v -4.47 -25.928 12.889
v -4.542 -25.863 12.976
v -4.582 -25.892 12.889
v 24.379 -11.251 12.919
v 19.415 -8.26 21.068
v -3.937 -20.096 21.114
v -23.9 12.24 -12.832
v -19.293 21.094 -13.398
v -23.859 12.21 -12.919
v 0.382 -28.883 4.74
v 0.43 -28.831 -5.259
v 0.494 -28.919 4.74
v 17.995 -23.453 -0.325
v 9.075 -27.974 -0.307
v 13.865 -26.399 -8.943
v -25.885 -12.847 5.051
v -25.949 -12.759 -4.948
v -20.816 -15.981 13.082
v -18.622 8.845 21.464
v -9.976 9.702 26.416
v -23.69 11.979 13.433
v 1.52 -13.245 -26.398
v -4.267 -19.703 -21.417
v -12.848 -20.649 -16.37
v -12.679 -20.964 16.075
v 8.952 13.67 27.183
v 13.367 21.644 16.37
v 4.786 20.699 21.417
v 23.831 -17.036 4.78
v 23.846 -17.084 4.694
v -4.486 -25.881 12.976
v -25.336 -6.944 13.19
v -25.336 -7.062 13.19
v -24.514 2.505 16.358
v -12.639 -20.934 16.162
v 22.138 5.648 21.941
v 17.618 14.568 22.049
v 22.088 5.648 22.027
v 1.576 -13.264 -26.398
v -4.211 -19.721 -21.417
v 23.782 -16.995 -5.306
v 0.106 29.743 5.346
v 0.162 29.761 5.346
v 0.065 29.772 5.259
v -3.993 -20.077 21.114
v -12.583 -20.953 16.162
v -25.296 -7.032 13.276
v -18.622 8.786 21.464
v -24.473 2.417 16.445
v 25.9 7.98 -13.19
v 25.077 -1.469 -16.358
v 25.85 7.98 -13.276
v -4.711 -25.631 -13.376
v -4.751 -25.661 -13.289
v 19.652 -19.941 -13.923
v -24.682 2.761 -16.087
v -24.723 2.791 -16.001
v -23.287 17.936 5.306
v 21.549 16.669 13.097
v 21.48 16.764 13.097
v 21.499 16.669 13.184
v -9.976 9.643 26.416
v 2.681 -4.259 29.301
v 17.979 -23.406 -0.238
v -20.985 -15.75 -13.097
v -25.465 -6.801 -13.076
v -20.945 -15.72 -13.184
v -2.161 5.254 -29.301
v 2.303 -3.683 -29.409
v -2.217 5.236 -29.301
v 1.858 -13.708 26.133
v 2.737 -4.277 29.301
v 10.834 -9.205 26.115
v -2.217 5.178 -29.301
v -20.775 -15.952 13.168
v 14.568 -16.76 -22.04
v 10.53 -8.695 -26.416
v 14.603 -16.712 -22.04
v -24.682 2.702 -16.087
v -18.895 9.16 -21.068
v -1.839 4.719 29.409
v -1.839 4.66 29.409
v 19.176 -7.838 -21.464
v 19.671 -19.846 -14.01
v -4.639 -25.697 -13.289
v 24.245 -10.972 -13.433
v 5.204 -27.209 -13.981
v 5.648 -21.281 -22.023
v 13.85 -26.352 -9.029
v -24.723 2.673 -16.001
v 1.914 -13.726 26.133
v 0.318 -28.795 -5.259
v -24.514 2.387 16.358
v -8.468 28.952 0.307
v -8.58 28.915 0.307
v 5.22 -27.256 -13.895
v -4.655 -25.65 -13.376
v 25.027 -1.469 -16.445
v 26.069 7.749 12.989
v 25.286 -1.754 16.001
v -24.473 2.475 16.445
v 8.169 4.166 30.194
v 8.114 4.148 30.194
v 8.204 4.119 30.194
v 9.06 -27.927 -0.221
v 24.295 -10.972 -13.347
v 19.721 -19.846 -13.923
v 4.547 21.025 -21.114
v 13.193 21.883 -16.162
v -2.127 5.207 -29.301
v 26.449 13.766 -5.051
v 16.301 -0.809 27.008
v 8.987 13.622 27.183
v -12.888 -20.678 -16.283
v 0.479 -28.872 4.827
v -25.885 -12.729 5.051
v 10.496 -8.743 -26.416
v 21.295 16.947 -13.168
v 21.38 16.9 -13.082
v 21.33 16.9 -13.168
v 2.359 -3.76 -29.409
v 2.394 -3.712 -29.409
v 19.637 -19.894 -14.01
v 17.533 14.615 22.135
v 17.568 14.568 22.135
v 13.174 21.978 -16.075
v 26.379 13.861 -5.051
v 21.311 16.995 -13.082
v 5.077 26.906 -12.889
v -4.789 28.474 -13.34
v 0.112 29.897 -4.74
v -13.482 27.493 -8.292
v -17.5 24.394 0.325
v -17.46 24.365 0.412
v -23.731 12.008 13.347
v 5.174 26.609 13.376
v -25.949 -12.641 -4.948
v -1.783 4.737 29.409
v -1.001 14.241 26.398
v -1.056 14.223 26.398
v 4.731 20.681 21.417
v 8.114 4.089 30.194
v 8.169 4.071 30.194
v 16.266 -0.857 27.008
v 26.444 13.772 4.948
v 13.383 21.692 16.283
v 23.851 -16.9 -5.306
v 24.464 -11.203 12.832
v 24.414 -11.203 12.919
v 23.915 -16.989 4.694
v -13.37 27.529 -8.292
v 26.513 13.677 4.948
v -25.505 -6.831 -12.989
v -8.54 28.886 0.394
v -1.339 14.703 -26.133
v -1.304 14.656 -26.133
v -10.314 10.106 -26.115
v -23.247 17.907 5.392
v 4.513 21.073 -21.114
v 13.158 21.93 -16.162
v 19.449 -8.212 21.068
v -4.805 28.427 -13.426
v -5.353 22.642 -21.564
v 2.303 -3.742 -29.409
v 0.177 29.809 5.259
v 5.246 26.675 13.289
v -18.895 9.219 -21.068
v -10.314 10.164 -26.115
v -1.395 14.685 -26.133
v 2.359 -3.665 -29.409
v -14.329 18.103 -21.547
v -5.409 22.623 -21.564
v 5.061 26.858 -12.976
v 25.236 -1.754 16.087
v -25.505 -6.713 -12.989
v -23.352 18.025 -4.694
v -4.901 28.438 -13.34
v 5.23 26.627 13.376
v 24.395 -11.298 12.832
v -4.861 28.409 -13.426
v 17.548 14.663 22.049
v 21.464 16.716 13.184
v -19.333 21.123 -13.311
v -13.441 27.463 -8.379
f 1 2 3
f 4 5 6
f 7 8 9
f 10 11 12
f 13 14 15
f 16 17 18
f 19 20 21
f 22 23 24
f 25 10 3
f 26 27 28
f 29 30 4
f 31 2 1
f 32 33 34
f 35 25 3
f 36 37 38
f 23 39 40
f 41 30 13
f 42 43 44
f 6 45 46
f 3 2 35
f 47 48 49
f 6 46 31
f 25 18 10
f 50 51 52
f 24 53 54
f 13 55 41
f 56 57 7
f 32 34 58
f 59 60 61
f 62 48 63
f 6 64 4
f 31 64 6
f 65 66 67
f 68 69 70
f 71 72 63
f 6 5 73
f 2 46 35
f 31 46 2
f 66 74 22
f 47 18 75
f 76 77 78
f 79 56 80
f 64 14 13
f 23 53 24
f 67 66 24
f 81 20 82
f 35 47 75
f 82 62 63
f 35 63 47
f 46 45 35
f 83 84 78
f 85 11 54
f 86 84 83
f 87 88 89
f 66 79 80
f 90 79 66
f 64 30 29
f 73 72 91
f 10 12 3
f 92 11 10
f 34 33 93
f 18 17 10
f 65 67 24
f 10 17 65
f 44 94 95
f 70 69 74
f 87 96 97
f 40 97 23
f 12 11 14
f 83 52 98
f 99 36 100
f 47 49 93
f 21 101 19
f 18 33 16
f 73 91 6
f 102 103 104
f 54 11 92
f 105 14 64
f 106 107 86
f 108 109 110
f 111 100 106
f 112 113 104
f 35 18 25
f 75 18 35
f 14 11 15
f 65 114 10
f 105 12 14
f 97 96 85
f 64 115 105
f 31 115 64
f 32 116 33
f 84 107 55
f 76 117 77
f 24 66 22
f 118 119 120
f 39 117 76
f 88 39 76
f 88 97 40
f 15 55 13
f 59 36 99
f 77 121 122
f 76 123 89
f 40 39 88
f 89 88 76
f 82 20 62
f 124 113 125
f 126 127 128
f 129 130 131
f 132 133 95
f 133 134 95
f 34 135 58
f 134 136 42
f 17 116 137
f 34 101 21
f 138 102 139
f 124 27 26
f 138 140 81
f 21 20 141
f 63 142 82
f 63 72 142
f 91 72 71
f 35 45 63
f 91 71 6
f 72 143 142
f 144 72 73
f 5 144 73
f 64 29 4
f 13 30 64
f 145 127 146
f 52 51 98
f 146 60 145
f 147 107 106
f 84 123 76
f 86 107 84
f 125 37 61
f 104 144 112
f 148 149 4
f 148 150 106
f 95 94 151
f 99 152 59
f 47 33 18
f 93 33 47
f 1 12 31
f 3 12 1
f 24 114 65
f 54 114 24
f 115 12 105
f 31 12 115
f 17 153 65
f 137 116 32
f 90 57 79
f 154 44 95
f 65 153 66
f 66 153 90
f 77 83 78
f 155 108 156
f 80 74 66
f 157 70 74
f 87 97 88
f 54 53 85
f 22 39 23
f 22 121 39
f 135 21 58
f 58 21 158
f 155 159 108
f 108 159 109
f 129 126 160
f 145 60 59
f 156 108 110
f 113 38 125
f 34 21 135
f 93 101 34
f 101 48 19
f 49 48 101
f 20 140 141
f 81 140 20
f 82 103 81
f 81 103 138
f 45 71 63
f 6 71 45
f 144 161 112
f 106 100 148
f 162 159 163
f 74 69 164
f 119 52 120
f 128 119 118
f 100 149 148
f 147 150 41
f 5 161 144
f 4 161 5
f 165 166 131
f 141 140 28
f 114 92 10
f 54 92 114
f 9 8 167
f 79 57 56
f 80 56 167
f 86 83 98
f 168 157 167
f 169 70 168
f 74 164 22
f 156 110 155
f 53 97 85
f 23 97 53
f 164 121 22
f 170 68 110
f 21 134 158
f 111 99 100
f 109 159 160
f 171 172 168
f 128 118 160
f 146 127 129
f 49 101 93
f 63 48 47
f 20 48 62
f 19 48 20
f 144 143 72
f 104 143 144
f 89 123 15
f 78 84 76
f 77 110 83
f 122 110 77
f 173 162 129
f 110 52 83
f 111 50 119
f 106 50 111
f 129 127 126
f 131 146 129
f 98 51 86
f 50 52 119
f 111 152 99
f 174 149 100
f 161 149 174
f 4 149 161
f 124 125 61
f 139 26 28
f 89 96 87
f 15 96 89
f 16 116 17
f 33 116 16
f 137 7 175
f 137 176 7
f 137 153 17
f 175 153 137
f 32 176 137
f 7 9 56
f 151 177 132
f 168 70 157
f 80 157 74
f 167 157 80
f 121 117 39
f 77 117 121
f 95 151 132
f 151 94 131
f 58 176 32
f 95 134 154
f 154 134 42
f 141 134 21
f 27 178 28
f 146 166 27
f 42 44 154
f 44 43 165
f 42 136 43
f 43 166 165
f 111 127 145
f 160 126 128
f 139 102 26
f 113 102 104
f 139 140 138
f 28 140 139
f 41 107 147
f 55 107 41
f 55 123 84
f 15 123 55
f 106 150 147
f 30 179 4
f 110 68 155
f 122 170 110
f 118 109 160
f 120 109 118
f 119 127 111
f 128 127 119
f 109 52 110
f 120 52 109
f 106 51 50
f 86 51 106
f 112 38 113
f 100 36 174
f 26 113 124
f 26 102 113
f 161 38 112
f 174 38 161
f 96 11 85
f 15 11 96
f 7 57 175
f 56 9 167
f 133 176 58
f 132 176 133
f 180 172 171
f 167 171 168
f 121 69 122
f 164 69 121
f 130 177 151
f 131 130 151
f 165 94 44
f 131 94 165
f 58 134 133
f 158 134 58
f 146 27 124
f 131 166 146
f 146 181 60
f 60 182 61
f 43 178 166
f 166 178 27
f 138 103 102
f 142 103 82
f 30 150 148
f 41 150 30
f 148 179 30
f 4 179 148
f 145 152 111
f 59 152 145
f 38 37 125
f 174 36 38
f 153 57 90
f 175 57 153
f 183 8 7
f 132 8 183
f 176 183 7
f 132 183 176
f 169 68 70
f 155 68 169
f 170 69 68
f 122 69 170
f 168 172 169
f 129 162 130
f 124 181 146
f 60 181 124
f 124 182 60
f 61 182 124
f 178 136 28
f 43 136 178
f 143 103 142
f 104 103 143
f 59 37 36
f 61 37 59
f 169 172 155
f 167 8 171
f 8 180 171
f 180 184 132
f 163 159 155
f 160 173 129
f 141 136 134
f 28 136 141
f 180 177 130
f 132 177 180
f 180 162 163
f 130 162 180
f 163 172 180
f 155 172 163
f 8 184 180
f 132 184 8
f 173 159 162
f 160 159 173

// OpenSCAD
// Auto-generated OpenSCAD file

    inner_points = 10*[[2.5800168516054605, 0.7980470298110209, -1.3189669327443228], [-2.4432744118438516, 0.24459871431141972, 1.6358172684915129], [2.4977459589942073, -0.14685368717772146, -1.6358172684915129], [-2.525545304455105, -0.7003020026773228, 1.3189669327443228], [-1.0273929293488884, 1.013504771559999, -2.6028581143850014], [-1.8854735183802727, 0.9189645126628418, -2.098120715161195], [1.9399450655306283, -0.8212194855291437, 2.098120715161195], [1.081864476499244, -0.9157597444263008, 2.6028581143850014], [0.014605949080104583, 2.9713492457347006, 0.5259255605908952], [-0.4670162451205472, -2.5601958994998366, -1.3289486129136048], [0.521487792270903, 2.657940926633535, 1.3289486129136048], [0.03986559807025124, -2.873604218601002, -0.5259255605908952], [2.1279729957209983, 1.6899773807507408, -1.3081687185560238], [-2.3649952986203884, 1.194958158554797, 1.3346706145662746], [1.9125850025799456, -0.7838048123199333, -2.137693666888984], [-2.5803832917614407, -1.2788240345158768, 0.5051456662333142], [2.6348548389117963, 1.376569061649575, -0.5051456662333142], [-1.85811345542959, 0.8815498394536314, 2.137693666888984], [2.419466845770744, -1.0972131314210989, -1.3346706145662746], [-2.0735014485706427, -1.5922323536170426, 1.3081687185560238], [-0.13542060028755343, 1.465591309374031, -2.6046263101375176], [-2.3819047474582464, 1.218081698276059, -1.2832066435763685], [-0.21769149289880618, 0.5206905923852883, -2.921476645884708], [-2.464175640069499, 0.27318098128731644, -1.600056979323559], [2.518647187219855, -0.17543595415361818, 1.600056979323559], [0.27216304004916203, -0.42294556525159, 2.921476645884708], [2.436376294608602, -1.1203366711423608, 1.2832066435763685], [0.18989214743790928, -1.3678462822403328, 2.6046263101375176], [0.008147114355070081, 2.980181651968014, -0.47401457364421196], [-0.8499334746763137, 2.8856413930708573, 0.03072282557959416], [-0.4226288719270348, -1.967382734173334, -2.1330644703101322], [-1.2807094609584186, -2.0619229930704908, -1.6283270710863262], [1.3351810081087743, 2.1596680202041894, 1.6283270710863262], [0.47710041907739065, 2.0651277613070325, 2.1330644703101322], [0.9044050218266696, -2.7878963659371587, -0.03072282557959416], [0.04632443279528574, -2.8824366248343156, 0.47401457364421196], [1.3142797798831267, 2.1882502871800864, -1.6075471767287453], [-2.320607925426876, 1.7877713238812996, 0.5305547571697469], [1.0480455788235277, -0.8695126649837768, -2.632896401900285], [-2.5868421264864754, -1.2699916282825632, -0.49479446800179294], [2.641313673636831, 1.3677366554162613, 0.49479446800179294], [-0.9935740316731719, 0.9672576921174749, 2.632896401900285], [2.3750794725772315, -1.6900262967476014, -0.5305547571697469], [-1.259808232732771, -2.090505260046388, 1.6075471767287453], [0.4497403561267084, 2.1025424345162427, -2.1027499117400468], [-2.3270667601519106, 1.796603730114613, -0.4693853770653609], [0.23435236298565587, -0.37123975855443125, -2.932274860073007], [-2.542454753292963, -0.677178462956061, -1.298910325398321], [2.5969263004433185, 0.7749234900897591, 1.298910325398321], [-0.17988081583530008, 0.4689847856881295, 2.932274860073007], [2.3815383073022662, -1.6988587029809148, 0.4693853770653609], [-0.3952688089763525, -2.004797407382544, 2.1027499117400468], [0.5045783434330445, 2.681064466354797, -1.2889286452290385], [-1.7419058037376494, 2.4335548552568254, 0.03249102133211079], [0.1560732497621926, -1.321599202797809, -2.6311282061477685], [-2.090410897408501, -1.569108813895781, -1.3097085395866195], [2.144882444558857, 1.666853841029479, 1.3097085395866195], [-0.10160170261183678, 1.419344229931507, 2.6311282061477685], [1.796377350888005, -2.3358098281231268, -0.03249102133211079], [-0.4501067962826887, -2.5833194392210985, 1.2889286452290385], [-0.5368524378149407, 2.2594080955840976, -2.1477812710372692], [-1.9252559959542506, 2.1064387433832827, -1.3310990036999262], [2.2038011054775724, 0.5648442997397853, 2.1940747320103373], [0.8153975473382632, 0.4118749475389705, 3.0107569993476804], [0.5632820446898252, -2.1233159333049074, -2.1935995998160314], [1.3834340952527309, -2.630421245967566, -0.8942810074082022], [-0.4820144505086047, 2.8379301274226516, -1.3339600045262612], [-1.3400950395399884, 2.7433898685254943, -0.8292226053024551], [1.7517572495931102, 1.456774650679505, 2.204872946198636], [0.8936766605617265, 1.3622343917823476, 2.7096103454224423], [1.4552543737511603, -1.6712293954908752, -2.1953677955685476], [1.9621362169419587, -1.984637714592041, -1.3923447432458382], [-1.428824766876276, 1.807321557770065, -2.1460130752847526], [1.6250989837883454, -0.08093923163574031, 2.6921384678479736], [0.5188946714963129, -2.7161290986314097, -1.3894837424195032]];

    outer_points = 10*[[-1.6237729602140323, -0.5180972863871907, 2.431576450233078], [1.6272083434635762, -0.4818835798868834, -2.4367208868087524], [-1.6272083434635762, 0.4818835798868834, 2.4367208868087524], [1.6237729602140323, 0.5180972863871907, -2.431576450233078], [-2.71186219611676, -0.003093019792710145, -1.2097195213409813], [-2.156528291374358, 0.003093019792710145, -2.0413239869120874], [2.156528291374358, -0.003093019792710145, 2.0413239869120874], [2.71186219611676, 0.003093019792710145, 1.2097195213409813], [-0.40575464686575385, -2.92699497773356, -0.29273029341267365], [-0.425865730701731, 2.92699497773356, -0.26261423713977006], [0.425865730701731, -2.92699497773356, 0.26261423713977006], [0.40575464686575385, 2.92699497773356, 0.29273029341267365], [-1.8651962514487022, -1.3251872098929274, 1.8927623358810832], [1.0425698239929058, -1.292796686112162, -2.4615751762416114], [-1.8741902015603906, 1.292796686112162, 1.9062306456891678], [1.0335758738812173, 1.3251872098929274, -2.448106866433527], [-1.0335758738812173, -1.3251872098929274, 2.448106866433527], [1.8741902015603906, -1.292796686112162, -1.9062306456891678], [-1.0425698239929058, 1.292796686112162, 2.4615751762416114], [1.8651962514487022, 1.3251872098929274, -1.8927623358810832], [-2.902434241444326, -0.5080880640822284, -0.3678986967098157], [-1.4485512037235218, -0.4918928021918457, -2.545067452771163], [-2.90586962469387, 0.4918928021918457, -0.36275426013414114], [-1.451986586973066, 0.5080880640822284, -2.5399230161954884], [1.451986586973066, -0.5080880640822284, 2.5399230161954884], [2.90586962469387, -0.4918928021918457, 0.36275426013414114], [1.4485512037235218, 0.4918928021918457, 2.545067452771163], [2.902434241444326, 0.5080880640822284, 0.3678986967098157], [-1.3572782093638605, -2.6210769157977993, -0.3246215052488573], [-0.8019443046214587, -2.6148908762123795, -1.1562259708199636], [-1.3752661095872372, 2.6148908762123795, -0.2976848856326887], [-0.8199322048448355, 2.6210769157977993, -1.129289351203795], [0.8199322048448355, -2.6210769157977993, 1.129289351203795], [1.3752661095872372, -2.6148908762123795, 0.2976848856326887], [0.8019443046214587, 2.6148908762123795, 1.1562259708199636], [1.3572782093638605, 2.6210769157977993, 0.3246215052488573], [-2.2592627255918067, -1.631105271828688, 1.026087221817059], [0.09316944510739966, -1.604900787633343, -2.49664582473453], [-2.2703798593160958, 1.604900787633343, 1.042734968281878], [0.08205231138311109, 1.631105271828688, -2.4799980782697113], [-0.08205231138311109, -1.631105271828688, 2.4799980782697113], [2.2703798593160958, -1.604900787633343, -1.042734968281878], [-0.09316944510739966, 1.604900787633343, 2.49664582473453], [2.2592627255918067, 1.631105271828688, -1.026087221817059], [-2.655452383347512, -1.319001170307507, 0.16259154440976942], [-0.8583541173907071, -1.2989827256975823, -2.5285370365707136], [-2.6644463334592, 1.2989827256975823, 0.17605985421785353], [-0.8673480675023955, 1.319001170307507, -2.51506872676263], [0.8673480675023955, -1.319001170307507, 2.51506872676263], [2.6644463334592, -1.2989827256975823, -0.17605985421785353], [0.8583541173907071, 1.2989827256975823, 2.5285370365707136], [2.655452383347512, 1.319001170307507, -0.16259154440976942], [-2.065255297014697, -2.126091093813244, 0.17912196061021834], [-0.6113722592938928, -2.109895831922861, -1.9980467954511292], [-2.0798078139885297, 2.109895831922861, 0.20091414365071247], [-0.6259247762677257, 2.126091093813244, -1.976254612410635], [0.6259247762677257, -2.126091093813244, 1.976254612410635], [2.0798078139885297, -2.109895831922861, -0.20091414365071247], [0.6113722592938928, 2.109895831922861, 1.9980467954511292], [2.065255297014697, 2.126091093813244, -0.17912196061021834], [-2.692835524077599, -1.3667819536544716, -0.8355665079706667], [-1.7942863910991966, -1.3567727313495095, -2.1811307984609085], [1.8036430242705312, -1.3667819536544716, 2.167119376032807], [2.7021921572489336, -1.3567727313495095, 0.8215550855425657], [-1.438337984179842, 2.6949682886817636, 0.6971063219317848], [-0.0927479475386308, 2.6949682886817636, 1.5956726478319931], [-2.102638437744784, -2.173871877160208, -0.8190360917702175], [-1.5473045330023827, -2.1676858375747883, -1.6506405573413236], [1.5622197330358616, -2.173871877160208, 1.628305261680813], [2.117553637778263, -2.1676858375747883, 0.7967007961097068], [-1.628910029507408, 2.1899732443922453, 1.5389271465629506], [-0.7972896519399231, 2.1899732443922453, 2.0942716771153944], [-2.502263478750033, -0.8617869093649534, -1.6773873326018327], [2.5081847286718237, -0.8617869093649534, 1.668520346749406], [-0.4889376052943356, 3.0070723902029446, 0.7321769704247032]];

    // Convex hull for inner set (I)
    module inner_hull() {
        hull() {
            for (p = inner_points) {
                translate(p) sphere(r=0.1);
            }
        }
    }

    // Convex hull for outer set (O) minus inner hull (O \ I)
    module outer_minus_inner() {
        difference() {
            hull() {
                for (p = outer_points) {
                    translate(p) sphere(r=0.1);
                }
            }
            inner_hull(); // Subtract inner hull
        }
    }

    // Convex hull for outer set (O) minus all translated inner hulls
    module outer_minus_AllTranslationInner() {
        difference() {
            hull() {
                for (p = outer_points) {
                    translate(p) sphere(r=0.1);
                }
            }
            hull() {
                translate([0,0,50]) inner_hull();
                translate([0,0,-50]) inner_hull();
            }; // Subtract translated inner hulls
        }
    }

    // Difference between outer_minus_inner and outer_minus_AllTranslationInner
    module outer_minus_inner_diff() {
        difference() {
            // Outer minus inner
            difference() {
                hull() {
                    for (p = outer_points) {
                        translate(p) sphere(r=0.1);
                    }
                }
                inner_hull();
            }

            // Subtract Outer minus AllTranslationInner
            difference() {
                hull() {
                    for (p = outer_points) {
                        translate(p) sphere(r=0.1);
                    }
                }
                hull() {
                    translate([0,0,50]) inner_hull();
                    translate([0,0,-50]) inner_hull();
                };
            }
        }
    }

    // Rendering all with colors applied
    color([1, 0, 0, 0.5]) inner_hull(); // Transparent red
    
